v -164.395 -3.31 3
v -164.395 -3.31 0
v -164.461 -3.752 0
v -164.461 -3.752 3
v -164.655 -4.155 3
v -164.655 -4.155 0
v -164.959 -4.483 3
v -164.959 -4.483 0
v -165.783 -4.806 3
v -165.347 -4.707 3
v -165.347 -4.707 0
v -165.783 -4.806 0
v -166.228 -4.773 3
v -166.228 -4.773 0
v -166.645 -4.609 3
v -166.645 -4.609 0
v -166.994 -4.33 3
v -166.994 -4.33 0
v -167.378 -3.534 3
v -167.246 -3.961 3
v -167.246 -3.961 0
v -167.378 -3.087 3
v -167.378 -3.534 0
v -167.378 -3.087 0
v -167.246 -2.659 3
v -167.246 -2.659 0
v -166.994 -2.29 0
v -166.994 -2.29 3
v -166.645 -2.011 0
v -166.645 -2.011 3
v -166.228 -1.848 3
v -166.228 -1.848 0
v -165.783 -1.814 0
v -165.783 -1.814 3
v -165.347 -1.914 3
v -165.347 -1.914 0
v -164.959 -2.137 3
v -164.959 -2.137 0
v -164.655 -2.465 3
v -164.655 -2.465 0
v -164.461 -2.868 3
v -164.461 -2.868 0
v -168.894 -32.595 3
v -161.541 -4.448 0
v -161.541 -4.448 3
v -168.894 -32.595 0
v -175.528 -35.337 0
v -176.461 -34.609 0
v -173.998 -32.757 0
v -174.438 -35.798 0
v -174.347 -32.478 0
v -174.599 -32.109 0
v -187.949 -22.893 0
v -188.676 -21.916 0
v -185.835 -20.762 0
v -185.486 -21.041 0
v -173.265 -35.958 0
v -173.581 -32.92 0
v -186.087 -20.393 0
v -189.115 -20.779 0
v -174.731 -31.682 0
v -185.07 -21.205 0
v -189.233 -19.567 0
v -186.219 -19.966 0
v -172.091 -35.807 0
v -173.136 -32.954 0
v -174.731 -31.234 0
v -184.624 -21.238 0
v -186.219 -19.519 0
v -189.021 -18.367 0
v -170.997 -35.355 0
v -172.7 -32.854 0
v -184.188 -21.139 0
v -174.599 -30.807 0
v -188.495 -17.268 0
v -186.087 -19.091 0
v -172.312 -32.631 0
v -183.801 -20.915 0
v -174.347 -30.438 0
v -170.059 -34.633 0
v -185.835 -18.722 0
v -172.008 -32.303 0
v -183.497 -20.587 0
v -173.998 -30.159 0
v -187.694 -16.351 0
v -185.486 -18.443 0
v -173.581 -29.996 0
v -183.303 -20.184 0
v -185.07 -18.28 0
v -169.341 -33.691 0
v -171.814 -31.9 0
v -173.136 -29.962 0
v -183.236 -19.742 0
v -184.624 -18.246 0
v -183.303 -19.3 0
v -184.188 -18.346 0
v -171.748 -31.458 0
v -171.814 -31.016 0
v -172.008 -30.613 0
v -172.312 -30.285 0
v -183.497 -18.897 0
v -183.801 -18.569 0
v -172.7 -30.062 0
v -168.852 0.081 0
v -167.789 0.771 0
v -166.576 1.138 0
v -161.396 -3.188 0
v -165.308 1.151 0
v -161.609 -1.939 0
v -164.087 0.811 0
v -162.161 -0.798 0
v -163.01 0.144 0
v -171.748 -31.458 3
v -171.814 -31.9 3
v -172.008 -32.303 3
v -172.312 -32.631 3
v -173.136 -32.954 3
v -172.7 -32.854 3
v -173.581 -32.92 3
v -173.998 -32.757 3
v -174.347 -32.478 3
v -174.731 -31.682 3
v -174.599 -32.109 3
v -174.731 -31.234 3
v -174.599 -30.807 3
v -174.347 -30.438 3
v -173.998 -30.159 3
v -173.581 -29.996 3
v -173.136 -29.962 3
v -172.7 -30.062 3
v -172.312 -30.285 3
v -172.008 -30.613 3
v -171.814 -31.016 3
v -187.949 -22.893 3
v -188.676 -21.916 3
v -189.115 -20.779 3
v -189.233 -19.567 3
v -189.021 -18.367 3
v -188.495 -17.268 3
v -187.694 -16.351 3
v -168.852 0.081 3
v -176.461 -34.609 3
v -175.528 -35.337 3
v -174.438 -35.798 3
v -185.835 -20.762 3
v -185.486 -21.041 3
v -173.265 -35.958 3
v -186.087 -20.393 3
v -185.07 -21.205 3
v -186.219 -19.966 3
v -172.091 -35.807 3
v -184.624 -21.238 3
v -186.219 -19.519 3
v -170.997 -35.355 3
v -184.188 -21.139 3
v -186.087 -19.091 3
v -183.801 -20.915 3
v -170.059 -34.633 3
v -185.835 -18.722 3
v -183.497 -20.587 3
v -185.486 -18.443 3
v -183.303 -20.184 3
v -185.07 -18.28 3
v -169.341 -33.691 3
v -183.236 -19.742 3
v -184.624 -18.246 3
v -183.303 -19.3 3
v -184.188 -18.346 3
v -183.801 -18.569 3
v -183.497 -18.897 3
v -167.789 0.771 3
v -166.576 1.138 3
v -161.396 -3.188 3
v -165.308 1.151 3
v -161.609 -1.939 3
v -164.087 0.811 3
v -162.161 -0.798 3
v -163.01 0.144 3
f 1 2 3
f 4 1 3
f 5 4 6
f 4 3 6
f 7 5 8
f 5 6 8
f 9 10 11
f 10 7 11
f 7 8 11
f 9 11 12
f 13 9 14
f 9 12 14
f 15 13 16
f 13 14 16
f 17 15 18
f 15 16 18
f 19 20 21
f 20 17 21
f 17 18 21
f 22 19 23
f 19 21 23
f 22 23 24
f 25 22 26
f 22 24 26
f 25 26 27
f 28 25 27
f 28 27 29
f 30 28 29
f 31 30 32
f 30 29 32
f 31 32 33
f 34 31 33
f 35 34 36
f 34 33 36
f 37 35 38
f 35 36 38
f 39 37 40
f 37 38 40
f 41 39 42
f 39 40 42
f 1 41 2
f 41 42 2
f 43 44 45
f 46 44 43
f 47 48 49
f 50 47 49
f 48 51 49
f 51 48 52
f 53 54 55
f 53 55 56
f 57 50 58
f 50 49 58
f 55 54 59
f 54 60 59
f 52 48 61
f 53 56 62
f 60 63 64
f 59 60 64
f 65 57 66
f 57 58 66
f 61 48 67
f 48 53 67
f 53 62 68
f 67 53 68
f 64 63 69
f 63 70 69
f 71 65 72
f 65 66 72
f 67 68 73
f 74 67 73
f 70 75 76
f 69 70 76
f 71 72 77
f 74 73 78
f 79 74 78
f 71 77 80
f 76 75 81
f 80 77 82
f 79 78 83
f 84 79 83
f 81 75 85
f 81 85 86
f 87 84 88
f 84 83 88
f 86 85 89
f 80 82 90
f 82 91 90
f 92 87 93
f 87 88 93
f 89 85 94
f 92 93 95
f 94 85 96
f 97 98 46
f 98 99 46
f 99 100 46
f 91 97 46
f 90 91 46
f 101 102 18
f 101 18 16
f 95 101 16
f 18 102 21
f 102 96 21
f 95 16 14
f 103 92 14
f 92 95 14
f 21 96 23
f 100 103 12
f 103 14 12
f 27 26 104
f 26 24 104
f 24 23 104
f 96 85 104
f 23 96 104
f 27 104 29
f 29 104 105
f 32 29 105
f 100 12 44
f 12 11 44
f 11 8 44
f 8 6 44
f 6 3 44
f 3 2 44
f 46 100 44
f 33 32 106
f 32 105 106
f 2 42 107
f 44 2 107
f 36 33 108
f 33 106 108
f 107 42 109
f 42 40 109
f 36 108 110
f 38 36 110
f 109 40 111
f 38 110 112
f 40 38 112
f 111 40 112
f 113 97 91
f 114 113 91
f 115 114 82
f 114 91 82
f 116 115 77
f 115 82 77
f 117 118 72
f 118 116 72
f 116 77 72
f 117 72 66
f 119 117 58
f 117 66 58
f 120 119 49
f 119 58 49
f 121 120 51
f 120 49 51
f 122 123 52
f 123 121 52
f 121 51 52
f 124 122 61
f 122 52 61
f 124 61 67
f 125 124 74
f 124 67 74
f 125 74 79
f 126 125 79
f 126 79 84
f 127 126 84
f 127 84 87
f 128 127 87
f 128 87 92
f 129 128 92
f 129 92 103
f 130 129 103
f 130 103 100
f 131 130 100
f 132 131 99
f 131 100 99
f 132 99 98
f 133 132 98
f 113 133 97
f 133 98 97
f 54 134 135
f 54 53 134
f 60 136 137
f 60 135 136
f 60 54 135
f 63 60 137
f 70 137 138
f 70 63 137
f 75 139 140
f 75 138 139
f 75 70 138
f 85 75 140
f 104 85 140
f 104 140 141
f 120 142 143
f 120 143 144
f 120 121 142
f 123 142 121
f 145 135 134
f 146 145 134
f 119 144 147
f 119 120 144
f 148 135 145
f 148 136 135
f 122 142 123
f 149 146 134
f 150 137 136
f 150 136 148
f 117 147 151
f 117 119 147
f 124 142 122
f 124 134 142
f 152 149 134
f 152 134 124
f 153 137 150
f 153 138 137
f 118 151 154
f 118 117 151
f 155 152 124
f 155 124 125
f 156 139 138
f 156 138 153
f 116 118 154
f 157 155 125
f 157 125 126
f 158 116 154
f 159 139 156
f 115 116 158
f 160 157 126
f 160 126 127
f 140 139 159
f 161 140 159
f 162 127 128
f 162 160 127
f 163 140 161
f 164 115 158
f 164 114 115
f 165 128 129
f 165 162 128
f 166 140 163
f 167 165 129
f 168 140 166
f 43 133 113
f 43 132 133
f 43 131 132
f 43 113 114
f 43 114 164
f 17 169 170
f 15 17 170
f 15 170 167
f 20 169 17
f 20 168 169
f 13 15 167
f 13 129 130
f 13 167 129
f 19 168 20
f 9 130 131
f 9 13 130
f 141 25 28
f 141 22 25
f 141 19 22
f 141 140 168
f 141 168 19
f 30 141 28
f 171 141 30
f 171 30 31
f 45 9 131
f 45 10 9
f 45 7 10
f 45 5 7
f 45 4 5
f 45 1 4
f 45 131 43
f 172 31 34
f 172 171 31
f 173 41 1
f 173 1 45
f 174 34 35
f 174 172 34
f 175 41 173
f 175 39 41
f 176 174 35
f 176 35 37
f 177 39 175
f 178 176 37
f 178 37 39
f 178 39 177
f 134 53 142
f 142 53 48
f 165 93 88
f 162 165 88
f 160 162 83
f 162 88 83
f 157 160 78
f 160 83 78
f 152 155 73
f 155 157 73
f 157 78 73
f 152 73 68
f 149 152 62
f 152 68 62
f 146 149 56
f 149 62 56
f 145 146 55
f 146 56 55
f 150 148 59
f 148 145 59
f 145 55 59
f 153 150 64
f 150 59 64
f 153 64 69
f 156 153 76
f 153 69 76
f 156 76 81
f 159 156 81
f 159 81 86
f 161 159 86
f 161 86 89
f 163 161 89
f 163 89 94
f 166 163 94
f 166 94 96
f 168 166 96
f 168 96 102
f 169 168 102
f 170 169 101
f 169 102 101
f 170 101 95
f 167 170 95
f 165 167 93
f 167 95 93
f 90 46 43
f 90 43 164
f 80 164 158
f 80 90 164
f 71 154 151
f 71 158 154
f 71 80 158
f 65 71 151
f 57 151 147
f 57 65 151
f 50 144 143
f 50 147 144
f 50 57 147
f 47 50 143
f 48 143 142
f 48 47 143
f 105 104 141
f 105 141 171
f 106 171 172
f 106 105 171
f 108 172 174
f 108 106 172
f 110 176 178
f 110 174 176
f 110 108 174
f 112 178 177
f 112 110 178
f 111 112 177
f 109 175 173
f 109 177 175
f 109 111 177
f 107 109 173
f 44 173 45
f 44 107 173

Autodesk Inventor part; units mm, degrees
ref_plane "YZ Plane" through (0, 0, 0) normal (1, 0, 0) x (0, 1, 0)
ref_plane "XZ Plane" through (0, 0, 0) normal (0, 1, 0) x (-1, 0, 0)
ref_plane "XY Plane" through (0, 0, 0) normal (0, 0, 1) x (1, 0, 0)
sketch "スケッチ1" plane through (0, 0, 0) normal (0, 0, 1) x (1, 0, 0)
  circle A0 centre (-165.8946, -3.3102) radius 1.5
  circle A1 centre (-136.5368, 15.7454) radius 1.5
  circle A2 centre (-82.4879, 34.801) radius 1.5
  circle A3 centre (-77.8211, 53.8566) radius 1.5
  circle A4 centre (-107.1789, 34.801) radius 1.5
  circle A5 centre (-110.4783, 13.7882) radius 1.5
  circle A6 centre (-138.4687, -7.2246) radius 1.5
  circle A7 centre (-184.7359, -19.7422) radius 1.5
  circle A8 centre (-173.2477, -31.458) radius 1.5
  circle A9 centre (-44.4492, 64.0137) radius 1.5
  circle A10 centre (-64.4423, 49.0046) radius 1.5
  circle A11 centre (-60.4494, 64.5064) radius 1.5
  line L0 (-64.2741, 70.3989) -> (-190.1939, -11.3332)
  arc A12 (-190.1939, -11.3332) -> (-190.9729, -27.5907) centre (-184.7359, -19.7422) ccw
  line L1 (-190.9729, -27.5907) -> (-178.2249, -37.7212)
  arc A13 (-178.2249, -37.7212) -> (-168.4448, -37.8558) centre (-173.2477, -31.458) ccw
  line L2 (-168.4448, -37.8558) -> (-40.2316, 58.3956)
  arc A14 (-40.2316, 58.3956) -> (-44.233, 71.0354) centre (-44.4492, 64.0137) ccw
  line L3 (-44.233, 71.0354) -> (-60.2332, 71.5281)
  arc A15 (-60.2332, 71.5281) -> (-64.2741, 70.3989) centre (-60.4494, 64.5064) ccw
  arc A16 (-161.5407, -4.4476) -> (-168.8524, 0.0812) centre (-165.8946, -3.3102) ccw
  arc A17 (-187.6936, -16.3507) -> (-187.9489, -22.8928) centre (-184.7359, -19.7422) ccw
  arc A18 (-176.4608, -34.6086) -> (-168.8938, -32.5954) centre (-173.2477, -31.458) ccw
  line L4 (-187.6936, -16.3507) -> (-168.8524, 0.0812)
  line L5 (-161.5407, -4.4476) -> (-168.8938, -32.5954)
  line L6 (-187.9489, -22.8928) -> (-176.4608, -34.6086)
  point P0 (0, 0)
  point P1 (0, 0)
  dimension "d0" = 3
  dimension "d1" = 3
  dimension "d2" = 3
extrude "押し出し1" add sketch "スケッチ1" along normal blind 3 contours L5 A18 L6 A17 L4 A16
properties part number "アーム抑えツイン1" material "ポリカーボネート、クリア"
